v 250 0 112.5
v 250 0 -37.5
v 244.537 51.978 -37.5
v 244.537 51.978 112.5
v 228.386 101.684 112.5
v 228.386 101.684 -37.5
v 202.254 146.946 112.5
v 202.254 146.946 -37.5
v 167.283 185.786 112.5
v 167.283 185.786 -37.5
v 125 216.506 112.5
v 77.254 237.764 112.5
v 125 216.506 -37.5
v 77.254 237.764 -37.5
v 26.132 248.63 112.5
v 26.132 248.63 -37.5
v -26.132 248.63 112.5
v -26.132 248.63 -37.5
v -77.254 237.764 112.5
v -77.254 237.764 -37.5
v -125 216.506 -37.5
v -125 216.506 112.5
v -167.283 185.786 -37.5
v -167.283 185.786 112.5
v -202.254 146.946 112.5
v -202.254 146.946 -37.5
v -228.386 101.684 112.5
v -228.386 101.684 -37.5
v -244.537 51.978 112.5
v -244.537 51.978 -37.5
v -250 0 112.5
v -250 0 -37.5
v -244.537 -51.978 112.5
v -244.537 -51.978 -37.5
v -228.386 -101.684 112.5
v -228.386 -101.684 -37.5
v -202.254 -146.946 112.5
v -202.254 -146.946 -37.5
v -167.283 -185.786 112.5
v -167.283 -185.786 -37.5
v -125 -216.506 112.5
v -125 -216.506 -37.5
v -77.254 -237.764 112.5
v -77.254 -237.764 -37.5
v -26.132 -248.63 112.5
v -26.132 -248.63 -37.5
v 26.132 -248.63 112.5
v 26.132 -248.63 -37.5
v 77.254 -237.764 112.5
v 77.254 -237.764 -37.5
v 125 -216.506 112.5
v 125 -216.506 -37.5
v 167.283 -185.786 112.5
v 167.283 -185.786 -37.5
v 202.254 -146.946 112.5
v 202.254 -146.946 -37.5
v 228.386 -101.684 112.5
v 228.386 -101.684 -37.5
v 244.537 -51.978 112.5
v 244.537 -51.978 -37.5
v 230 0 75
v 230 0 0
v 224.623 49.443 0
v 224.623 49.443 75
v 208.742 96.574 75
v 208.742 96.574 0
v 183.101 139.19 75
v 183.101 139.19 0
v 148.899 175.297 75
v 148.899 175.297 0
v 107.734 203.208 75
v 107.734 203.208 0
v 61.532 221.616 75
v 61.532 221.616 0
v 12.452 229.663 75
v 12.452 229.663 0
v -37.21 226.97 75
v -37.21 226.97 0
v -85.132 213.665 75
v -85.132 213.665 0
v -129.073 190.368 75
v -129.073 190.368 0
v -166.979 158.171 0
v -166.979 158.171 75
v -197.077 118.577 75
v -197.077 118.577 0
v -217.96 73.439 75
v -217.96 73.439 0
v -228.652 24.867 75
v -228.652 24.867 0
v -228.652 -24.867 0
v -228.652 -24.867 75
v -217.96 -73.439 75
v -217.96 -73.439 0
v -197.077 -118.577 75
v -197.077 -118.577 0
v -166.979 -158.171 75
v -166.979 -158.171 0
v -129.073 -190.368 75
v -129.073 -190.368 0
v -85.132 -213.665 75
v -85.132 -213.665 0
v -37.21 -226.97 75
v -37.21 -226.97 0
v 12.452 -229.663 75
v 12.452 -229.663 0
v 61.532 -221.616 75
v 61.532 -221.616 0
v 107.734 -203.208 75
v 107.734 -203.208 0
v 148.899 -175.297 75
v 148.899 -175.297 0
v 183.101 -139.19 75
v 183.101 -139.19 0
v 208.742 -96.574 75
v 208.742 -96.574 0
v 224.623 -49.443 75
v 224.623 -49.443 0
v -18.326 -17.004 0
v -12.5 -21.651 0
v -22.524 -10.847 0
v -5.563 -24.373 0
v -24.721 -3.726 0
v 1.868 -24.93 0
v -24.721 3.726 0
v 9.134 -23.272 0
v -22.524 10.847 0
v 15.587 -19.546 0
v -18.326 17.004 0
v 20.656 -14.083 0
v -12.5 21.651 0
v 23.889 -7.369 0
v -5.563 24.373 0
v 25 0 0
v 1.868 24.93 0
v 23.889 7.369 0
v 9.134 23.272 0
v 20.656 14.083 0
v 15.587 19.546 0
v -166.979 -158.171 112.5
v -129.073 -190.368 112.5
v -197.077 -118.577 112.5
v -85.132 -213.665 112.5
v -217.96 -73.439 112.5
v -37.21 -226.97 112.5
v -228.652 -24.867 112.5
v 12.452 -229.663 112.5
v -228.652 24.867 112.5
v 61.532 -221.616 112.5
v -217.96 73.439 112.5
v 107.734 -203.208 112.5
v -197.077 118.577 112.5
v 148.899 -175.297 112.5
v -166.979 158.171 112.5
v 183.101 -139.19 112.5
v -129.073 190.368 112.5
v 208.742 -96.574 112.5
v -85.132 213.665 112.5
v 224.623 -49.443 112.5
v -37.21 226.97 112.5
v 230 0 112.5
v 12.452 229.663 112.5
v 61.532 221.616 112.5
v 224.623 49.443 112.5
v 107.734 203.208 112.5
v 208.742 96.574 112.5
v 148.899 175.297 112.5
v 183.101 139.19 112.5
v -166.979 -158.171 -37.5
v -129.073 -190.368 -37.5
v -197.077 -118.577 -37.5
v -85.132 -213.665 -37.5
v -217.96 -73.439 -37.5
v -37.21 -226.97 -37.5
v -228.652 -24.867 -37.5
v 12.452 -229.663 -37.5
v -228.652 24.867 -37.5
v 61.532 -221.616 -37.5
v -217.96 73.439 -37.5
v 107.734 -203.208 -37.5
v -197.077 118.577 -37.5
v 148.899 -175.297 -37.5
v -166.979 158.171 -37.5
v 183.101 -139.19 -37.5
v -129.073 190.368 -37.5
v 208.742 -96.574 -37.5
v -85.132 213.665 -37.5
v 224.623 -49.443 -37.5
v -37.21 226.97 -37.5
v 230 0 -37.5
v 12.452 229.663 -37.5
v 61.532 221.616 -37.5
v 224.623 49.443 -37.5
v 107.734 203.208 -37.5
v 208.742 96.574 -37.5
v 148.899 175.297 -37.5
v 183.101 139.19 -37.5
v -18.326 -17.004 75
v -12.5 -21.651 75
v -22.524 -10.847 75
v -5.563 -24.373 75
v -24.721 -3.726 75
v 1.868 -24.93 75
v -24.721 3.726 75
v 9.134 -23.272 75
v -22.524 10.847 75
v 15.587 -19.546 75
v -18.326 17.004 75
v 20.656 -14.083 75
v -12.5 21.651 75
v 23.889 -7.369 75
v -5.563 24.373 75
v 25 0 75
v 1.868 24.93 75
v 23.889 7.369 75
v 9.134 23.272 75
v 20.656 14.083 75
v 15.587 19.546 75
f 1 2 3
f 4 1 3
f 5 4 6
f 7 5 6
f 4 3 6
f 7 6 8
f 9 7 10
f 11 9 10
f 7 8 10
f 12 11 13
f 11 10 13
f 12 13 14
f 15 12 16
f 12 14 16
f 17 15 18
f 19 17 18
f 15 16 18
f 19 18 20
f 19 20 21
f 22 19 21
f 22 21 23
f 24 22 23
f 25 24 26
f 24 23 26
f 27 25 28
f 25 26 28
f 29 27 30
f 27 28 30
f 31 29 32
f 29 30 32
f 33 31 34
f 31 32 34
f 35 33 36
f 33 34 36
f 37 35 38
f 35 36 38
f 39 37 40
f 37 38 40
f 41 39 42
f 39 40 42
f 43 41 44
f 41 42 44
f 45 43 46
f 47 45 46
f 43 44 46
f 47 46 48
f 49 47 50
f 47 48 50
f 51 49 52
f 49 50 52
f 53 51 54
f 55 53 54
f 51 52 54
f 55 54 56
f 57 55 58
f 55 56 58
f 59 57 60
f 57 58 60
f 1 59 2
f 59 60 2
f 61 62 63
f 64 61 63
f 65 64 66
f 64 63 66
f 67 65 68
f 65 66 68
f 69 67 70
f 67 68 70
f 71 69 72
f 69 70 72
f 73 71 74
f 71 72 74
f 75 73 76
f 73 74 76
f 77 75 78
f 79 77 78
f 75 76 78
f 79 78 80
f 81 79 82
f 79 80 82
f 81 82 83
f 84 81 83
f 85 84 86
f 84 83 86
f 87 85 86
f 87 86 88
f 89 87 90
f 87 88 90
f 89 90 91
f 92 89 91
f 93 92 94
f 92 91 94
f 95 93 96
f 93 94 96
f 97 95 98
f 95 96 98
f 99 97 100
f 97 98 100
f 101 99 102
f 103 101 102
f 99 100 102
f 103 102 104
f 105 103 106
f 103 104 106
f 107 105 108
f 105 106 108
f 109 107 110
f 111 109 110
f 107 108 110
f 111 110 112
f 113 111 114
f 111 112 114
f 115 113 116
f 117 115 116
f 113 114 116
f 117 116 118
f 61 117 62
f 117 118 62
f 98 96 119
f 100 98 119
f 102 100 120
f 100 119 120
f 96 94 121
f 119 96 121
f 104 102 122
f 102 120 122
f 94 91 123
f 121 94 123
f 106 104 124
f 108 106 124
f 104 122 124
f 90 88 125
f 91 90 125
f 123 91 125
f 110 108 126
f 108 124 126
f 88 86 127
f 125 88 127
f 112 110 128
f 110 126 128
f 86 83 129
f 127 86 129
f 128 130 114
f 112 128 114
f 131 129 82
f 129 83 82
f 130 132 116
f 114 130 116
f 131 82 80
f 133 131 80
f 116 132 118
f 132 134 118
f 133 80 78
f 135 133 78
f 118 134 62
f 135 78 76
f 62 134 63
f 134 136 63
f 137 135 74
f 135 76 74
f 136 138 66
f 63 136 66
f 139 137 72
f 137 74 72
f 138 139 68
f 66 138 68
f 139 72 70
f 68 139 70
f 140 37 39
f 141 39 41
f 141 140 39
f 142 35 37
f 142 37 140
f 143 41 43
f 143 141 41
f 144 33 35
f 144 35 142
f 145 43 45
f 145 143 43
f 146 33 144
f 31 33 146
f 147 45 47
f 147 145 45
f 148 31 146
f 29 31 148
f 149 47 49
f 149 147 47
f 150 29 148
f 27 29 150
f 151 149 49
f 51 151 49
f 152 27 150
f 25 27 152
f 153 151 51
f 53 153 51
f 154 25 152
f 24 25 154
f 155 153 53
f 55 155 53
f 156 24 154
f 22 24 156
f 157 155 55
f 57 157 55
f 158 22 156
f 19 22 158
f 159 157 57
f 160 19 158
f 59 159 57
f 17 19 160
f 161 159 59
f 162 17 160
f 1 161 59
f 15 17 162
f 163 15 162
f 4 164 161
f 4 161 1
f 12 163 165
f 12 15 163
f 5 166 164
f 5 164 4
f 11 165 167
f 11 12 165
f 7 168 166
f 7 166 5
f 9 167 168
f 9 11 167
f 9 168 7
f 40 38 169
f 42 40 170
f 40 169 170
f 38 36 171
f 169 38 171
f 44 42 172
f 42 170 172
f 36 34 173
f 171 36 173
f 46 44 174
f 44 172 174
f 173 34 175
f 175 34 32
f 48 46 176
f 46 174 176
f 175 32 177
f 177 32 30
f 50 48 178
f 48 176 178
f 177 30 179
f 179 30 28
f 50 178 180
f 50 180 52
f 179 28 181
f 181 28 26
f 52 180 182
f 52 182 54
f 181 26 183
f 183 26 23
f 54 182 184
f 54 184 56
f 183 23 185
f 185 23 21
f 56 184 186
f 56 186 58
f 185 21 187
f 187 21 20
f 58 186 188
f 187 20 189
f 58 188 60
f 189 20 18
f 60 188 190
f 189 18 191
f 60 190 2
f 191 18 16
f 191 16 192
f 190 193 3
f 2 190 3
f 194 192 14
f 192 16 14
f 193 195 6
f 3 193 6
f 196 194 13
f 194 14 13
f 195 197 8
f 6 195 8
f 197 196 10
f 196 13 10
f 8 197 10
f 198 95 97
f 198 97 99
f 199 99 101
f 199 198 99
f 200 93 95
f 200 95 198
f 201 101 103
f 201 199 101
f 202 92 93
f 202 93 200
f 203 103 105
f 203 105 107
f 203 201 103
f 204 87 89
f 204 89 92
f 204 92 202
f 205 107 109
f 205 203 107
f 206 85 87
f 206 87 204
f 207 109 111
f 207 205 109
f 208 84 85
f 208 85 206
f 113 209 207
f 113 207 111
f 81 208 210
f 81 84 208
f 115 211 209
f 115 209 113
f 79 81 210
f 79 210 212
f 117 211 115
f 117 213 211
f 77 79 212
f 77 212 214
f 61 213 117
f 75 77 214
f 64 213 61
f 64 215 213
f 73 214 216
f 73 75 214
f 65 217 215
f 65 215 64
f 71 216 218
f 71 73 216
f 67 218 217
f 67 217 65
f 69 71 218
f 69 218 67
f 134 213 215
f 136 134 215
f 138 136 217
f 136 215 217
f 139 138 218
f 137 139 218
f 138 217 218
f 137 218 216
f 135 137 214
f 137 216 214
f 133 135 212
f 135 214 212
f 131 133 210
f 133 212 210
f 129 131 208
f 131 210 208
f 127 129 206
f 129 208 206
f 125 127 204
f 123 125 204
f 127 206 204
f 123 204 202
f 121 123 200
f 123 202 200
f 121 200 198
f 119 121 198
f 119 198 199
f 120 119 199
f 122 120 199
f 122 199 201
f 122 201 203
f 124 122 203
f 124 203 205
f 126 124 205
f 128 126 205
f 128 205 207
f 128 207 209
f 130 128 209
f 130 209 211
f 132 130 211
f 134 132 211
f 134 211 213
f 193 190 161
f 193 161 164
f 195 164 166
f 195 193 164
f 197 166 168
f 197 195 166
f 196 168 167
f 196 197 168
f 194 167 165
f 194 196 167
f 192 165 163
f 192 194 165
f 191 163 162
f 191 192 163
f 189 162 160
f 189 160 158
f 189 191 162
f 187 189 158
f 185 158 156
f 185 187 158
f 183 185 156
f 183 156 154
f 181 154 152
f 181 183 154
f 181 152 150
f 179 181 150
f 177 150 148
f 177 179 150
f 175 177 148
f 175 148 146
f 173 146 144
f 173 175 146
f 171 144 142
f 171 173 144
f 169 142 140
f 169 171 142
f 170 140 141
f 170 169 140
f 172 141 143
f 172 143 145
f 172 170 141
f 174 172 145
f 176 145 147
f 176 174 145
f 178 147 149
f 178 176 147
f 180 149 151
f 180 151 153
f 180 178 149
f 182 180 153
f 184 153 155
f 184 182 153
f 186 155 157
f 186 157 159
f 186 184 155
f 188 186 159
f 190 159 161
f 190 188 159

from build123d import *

# Parameters (mm, degrees)
SKETCH1_R                = 230
BOSS_EXTRUDE1_DEPTH      = 75
BOSS_EXTRUDE2_DEPTH      = 37.5
BOSS_EXTRUDE2_DEPTH_BACK = 112.5
SKETCH2_R                = 250
SKETCH2_R_2              = 230
SKETCH3_R                = 25
CUT_EXTRUDE1_DEPTH       = 372.020551991


with BuildPart() as part:
    # Sketch1 → Boss-Extrude1 (new body)
    with BuildSketch(Plane.XY):
        Circle(SKETCH1_R)
    extrude(amount=BOSS_EXTRUDE1_DEPTH)

    # Sketch3 → Cut-Extrude1 (cut, through all)
    with BuildSketch(Plane.XY.offset(75)):
        Circle(SKETCH3_R)
    extrude(amount=-CUT_EXTRUDE1_DEPTH, mode=Mode.SUBTRACT)


with BuildPart() as body_2:
    # Sketch2 → Boss-Extrude2 (new, two sides: drawn at the far end of the back side and taken through both)
    with BuildSketch(Plane.XY.offset(75).offset(-BOSS_EXTRUDE2_DEPTH_BACK)):
        Circle(SKETCH2_R)
        Circle(SKETCH2_R_2, mode=Mode.SUBTRACT)
    extrude(amount=BOSS_EXTRUDE2_DEPTH + BOSS_EXTRUDE2_DEPTH_BACK)


solid = Compound([part.part, body_2.part])
